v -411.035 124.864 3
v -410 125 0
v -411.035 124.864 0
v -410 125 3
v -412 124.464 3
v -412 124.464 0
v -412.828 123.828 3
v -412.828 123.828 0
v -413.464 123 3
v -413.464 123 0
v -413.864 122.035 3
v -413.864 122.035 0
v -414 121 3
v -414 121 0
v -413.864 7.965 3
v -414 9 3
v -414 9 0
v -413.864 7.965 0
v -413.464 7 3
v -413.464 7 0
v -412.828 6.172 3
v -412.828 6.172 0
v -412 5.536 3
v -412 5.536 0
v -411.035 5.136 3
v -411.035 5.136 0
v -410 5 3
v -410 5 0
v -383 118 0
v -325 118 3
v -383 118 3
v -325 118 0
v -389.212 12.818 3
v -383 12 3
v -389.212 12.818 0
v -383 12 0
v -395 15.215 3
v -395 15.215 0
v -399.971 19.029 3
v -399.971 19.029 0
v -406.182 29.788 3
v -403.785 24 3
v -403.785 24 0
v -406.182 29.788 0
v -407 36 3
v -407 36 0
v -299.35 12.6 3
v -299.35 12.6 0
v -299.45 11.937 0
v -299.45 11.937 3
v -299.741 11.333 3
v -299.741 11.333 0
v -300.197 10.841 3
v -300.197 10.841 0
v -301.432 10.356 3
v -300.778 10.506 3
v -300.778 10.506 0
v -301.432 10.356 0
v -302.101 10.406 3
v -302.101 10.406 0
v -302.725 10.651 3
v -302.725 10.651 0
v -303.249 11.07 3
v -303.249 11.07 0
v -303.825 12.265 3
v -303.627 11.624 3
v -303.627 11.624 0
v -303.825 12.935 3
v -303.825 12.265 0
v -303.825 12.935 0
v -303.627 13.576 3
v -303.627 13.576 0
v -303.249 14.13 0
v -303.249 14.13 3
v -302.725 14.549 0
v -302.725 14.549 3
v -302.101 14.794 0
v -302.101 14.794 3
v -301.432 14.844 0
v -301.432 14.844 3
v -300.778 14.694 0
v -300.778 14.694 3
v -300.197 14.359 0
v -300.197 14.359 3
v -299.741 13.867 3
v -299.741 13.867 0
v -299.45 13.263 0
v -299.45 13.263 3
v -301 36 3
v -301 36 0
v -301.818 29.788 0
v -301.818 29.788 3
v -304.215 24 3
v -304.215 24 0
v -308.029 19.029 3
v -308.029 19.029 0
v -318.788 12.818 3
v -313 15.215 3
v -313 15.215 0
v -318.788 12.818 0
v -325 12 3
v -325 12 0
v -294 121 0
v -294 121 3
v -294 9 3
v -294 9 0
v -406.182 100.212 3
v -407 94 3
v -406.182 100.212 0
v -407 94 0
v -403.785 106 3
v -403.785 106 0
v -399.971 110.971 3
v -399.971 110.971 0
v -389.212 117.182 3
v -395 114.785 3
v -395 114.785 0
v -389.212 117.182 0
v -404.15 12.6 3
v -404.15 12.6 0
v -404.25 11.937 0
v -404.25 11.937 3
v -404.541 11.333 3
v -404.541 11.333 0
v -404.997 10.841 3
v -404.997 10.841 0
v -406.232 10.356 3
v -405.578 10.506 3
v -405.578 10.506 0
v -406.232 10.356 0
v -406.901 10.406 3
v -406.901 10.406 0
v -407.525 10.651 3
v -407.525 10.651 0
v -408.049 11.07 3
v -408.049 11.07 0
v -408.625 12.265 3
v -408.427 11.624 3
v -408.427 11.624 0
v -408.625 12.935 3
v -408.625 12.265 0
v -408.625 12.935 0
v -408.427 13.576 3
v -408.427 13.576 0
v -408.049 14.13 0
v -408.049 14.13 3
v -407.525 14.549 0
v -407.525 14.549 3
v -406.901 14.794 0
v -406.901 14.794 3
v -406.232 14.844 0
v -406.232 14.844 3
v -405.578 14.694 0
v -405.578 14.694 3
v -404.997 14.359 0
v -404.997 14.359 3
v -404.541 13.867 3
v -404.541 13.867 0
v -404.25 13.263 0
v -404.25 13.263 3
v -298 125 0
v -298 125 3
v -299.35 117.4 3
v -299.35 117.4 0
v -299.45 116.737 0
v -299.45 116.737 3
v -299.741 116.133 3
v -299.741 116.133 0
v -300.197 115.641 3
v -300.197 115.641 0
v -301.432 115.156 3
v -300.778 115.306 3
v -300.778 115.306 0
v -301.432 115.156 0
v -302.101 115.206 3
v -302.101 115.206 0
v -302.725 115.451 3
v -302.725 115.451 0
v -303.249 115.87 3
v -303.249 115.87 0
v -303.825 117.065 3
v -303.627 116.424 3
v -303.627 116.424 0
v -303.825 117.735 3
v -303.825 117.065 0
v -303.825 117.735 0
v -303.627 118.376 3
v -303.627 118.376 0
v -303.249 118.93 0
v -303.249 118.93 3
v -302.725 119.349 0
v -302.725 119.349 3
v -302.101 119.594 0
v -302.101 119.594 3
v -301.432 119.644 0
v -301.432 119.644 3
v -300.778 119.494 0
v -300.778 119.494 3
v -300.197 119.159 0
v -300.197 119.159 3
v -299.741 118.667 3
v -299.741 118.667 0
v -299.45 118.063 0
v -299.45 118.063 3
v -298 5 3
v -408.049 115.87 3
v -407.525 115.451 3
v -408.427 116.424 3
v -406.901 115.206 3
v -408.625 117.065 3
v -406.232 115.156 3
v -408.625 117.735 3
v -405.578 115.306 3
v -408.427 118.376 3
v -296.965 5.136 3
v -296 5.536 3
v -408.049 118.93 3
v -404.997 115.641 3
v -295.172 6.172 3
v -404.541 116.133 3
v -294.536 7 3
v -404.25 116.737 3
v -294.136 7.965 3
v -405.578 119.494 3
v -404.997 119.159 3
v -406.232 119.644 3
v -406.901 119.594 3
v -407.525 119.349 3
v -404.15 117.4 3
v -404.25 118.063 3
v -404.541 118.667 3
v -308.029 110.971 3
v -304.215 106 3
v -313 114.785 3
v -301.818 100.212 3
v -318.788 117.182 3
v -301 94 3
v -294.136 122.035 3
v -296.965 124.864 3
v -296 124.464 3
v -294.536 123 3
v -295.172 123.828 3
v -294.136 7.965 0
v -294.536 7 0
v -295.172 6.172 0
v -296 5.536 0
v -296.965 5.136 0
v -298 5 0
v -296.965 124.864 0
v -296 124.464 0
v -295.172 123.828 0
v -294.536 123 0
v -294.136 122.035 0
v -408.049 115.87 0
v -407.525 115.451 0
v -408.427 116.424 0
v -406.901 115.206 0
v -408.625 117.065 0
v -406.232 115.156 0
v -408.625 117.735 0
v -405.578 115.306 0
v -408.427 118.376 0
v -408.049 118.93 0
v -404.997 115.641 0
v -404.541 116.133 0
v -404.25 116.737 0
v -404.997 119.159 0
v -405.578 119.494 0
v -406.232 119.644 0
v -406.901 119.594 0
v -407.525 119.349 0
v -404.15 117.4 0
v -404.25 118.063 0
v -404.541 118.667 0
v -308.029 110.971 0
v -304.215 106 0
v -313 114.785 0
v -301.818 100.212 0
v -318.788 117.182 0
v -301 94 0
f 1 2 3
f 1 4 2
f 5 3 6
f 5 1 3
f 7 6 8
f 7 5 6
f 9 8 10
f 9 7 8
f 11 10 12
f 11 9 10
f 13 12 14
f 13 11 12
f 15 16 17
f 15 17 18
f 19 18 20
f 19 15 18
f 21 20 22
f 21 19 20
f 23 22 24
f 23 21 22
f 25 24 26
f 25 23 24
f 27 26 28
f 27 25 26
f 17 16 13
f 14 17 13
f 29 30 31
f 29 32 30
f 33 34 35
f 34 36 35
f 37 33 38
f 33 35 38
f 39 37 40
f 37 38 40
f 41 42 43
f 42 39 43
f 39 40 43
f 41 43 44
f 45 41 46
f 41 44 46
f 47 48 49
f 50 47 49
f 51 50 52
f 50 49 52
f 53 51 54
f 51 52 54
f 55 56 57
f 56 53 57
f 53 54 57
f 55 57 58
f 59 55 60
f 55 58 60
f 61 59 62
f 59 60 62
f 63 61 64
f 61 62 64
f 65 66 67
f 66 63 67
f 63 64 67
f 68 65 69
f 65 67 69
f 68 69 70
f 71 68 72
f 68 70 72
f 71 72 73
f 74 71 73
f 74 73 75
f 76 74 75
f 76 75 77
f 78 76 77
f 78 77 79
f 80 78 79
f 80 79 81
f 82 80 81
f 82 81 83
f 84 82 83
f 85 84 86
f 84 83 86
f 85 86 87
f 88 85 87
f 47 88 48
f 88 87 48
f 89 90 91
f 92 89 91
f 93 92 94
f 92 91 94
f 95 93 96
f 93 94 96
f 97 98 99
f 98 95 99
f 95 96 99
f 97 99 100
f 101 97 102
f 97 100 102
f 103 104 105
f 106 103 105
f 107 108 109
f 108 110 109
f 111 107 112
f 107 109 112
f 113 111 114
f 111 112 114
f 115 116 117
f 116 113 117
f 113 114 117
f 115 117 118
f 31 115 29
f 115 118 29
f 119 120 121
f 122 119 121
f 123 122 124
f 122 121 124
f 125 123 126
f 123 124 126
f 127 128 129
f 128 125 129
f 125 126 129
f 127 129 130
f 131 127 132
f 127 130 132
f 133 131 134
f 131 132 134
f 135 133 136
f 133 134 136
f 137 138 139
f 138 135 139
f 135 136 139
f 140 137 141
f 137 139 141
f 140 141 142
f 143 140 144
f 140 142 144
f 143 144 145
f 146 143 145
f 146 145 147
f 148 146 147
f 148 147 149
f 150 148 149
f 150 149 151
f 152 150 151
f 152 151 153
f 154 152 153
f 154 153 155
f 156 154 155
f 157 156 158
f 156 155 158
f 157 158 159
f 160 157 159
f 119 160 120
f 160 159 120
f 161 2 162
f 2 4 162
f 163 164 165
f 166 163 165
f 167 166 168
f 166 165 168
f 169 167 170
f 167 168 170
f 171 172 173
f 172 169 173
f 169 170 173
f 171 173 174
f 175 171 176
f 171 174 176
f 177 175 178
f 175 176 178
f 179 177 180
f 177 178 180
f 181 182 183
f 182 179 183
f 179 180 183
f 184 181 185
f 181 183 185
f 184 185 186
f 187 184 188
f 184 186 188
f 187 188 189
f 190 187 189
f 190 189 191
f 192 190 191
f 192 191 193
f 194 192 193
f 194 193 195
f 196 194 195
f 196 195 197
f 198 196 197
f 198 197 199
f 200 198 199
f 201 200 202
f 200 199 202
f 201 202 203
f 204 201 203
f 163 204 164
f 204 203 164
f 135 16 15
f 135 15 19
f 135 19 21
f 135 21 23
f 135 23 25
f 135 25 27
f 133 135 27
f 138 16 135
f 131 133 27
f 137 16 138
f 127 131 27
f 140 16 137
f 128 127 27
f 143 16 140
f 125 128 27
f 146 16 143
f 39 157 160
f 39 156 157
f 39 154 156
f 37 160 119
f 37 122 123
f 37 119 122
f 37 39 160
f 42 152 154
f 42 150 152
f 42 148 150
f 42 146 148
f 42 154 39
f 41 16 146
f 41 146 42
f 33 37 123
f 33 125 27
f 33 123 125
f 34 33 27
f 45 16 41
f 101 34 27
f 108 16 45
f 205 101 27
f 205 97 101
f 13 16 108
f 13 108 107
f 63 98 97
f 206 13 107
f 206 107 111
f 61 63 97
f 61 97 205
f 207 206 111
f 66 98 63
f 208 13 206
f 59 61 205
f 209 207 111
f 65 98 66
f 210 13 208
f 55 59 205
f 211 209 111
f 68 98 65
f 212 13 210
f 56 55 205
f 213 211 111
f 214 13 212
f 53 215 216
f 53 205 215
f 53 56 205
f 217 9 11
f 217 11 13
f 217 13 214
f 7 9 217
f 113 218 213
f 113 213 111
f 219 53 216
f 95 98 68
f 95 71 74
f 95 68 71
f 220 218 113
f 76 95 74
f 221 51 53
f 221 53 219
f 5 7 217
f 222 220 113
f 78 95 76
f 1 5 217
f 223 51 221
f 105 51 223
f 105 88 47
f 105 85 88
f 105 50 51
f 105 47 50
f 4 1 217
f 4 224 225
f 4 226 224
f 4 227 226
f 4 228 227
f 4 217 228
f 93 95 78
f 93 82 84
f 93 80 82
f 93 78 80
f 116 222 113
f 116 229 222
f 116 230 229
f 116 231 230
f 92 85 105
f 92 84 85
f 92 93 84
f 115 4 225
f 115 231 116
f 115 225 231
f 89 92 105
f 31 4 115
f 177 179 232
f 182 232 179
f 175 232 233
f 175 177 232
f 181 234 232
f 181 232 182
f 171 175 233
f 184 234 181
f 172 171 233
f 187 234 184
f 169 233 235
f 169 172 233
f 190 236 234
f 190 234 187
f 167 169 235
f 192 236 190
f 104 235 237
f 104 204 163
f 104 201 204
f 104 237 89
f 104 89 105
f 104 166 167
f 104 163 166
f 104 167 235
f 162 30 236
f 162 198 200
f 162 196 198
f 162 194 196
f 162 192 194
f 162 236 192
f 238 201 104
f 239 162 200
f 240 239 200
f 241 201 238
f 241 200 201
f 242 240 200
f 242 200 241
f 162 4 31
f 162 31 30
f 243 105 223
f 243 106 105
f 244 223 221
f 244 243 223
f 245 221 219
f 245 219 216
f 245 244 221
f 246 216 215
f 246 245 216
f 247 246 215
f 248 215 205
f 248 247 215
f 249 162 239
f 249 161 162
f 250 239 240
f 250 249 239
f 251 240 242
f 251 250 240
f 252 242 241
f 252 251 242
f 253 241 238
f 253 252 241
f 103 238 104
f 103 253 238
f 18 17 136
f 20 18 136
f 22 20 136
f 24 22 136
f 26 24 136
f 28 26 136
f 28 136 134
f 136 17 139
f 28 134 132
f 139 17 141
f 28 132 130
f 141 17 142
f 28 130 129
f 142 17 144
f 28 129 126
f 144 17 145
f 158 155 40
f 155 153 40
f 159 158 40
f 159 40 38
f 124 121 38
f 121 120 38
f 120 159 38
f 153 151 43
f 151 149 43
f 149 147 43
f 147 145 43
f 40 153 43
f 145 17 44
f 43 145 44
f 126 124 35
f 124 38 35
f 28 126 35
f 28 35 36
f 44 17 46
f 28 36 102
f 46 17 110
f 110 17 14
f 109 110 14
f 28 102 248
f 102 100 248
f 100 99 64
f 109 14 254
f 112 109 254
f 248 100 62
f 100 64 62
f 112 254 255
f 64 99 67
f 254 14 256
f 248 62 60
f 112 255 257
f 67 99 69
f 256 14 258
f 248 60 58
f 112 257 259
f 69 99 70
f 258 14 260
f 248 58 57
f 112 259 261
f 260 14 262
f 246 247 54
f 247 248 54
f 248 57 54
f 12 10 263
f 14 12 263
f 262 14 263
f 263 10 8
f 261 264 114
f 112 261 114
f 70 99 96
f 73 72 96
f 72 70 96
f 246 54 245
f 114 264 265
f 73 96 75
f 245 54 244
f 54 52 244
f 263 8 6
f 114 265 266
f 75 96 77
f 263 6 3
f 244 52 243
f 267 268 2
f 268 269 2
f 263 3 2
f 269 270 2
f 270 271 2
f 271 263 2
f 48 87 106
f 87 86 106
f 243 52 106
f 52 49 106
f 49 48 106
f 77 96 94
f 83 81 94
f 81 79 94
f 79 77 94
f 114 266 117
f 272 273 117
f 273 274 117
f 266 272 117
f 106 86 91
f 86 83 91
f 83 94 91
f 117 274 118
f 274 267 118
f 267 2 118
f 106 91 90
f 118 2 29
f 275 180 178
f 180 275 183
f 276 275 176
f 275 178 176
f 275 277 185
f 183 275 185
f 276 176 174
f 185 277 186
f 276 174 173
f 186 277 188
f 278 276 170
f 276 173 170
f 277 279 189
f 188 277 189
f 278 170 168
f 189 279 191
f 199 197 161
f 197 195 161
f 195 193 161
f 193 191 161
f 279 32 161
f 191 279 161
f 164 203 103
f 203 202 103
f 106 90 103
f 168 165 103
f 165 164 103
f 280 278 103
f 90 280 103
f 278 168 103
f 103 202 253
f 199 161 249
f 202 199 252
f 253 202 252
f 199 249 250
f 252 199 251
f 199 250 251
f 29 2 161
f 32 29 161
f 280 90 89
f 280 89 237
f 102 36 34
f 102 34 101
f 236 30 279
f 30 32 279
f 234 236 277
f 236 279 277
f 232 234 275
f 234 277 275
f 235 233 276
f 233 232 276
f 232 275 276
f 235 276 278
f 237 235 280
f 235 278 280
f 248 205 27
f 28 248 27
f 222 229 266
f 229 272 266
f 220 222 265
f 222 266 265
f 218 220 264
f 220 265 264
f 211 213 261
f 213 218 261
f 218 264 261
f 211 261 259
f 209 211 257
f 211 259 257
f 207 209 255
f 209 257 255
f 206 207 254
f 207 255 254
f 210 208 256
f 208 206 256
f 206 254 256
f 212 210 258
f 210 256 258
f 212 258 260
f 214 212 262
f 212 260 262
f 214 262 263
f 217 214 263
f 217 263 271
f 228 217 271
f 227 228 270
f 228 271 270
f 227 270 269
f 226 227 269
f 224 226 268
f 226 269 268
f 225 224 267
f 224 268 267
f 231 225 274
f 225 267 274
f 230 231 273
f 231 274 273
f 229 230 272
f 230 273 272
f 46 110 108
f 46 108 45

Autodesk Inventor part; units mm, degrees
ref_plane "YZ Plane" through (0, 0, 0) normal (1, 0, 0) x (0, 1, 0)
ref_plane "XZ Plane" through (0, 0, 0) normal (0, 1, 0) x (-1, 0, 0)
ref_plane "XY Plane" through (0, 0, 0) normal (0, 0, 1) x (1, 0, 0)
sketch "スケッチ1" plane through (0, 0, 0) normal (0, 0, 1) x (1, 0, 0)
  circle A0 centre (5, 125) radius 2.25 construction
  circle A1 centre (5, 5) radius 2.25 construction
  circle A2 centre (-473, 125) radius 2.25 construction
  circle A3 centre (-473, 5) radius 2.25 construction
  line L0 (-478, 130) -> (-478, 0) construction
  line L1 (10, 0) -> (10, 130) construction
  line L2 (10, 130) -> (-478, 130)
  line L3 (-478, 130) -> (-478, 0)
  line L4 (-478, 0) -> (10, 0)
  line L5 (10, 0) -> (10, 130)
  circle A4 centre (5, 125) radius 1.6
  circle A5 centre (5, 5) radius 1.6
  circle A6 centre (-473, 5) radius 1.6
  circle A7 centre (-473, 125) radius 1.6
  line L6 (10, 65) -> (-478, 65) construction
  line L7 (-205, 118) -> (-263, 118)
  line L8 (-287, 94) -> (-287, 36)
  line L9 (-263, 12) -> (-205, 12)
  line L10 (-181, 36) -> (-181, 94)
  arc A8 (-181, 94) -> (-205, 118) centre (-205, 94) ccw
  arc A9 (-205, 12) -> (-181, 36) centre (-205, 36) ccw
  arc A10 (-287, 36) -> (-263, 12) centre (-263, 36) ccw
  arc A11 (-263, 118) -> (-287, 94) centre (-263, 94) ccw
  line L11 (-174, 125) -> (-294, 125) construction
  line L12 (-294, 125) -> (-294, 5) construction
  line L13 (-294, 5) -> (-174, 5) construction
  line L14 (-174, 5) -> (-174, 125) construction
  line L15 (-181.6, 117.4) -> (-286.4, 117.4) construction
  line L16 (-286.4, 117.4) -> (-286.4, 12.6) construction
  line L17 (-286.4, 12.6) -> (-181.6, 12.6) construction
  line L18 (-181.6, 12.6) -> (-181.6, 117.4) construction
  circle A12 centre (-181.6, 117.4) radius 2.25
  circle A13 centre (-181.6, 12.6) radius 2.25
  circle A14 centre (-286.4, 12.6) radius 2.25
  circle A15 centre (-286.4, 117.4) radius 2.25
  circle A16 centre (-301.6, 117.4) radius 2.25
  arc A17 (-301, 94) -> (-325, 118) centre (-325, 94) ccw
  line L19 (-301, 36) -> (-301, 94)
  arc A18 (-325, 12) -> (-301, 36) centre (-325, 36) ccw
  circle A19 centre (-301.6, 12.6) radius 2.25
  line L20 (-383, 12) -> (-325, 12)
  arc A20 (-407, 36) -> (-383, 12) centre (-383, 36) ccw
  circle A21 centre (-406.4, 12.6) radius 2.25
  line L21 (-407, 94) -> (-407, 36)
  circle A22 centre (-406.4, 117.4) radius 2.25
  arc A23 (-383, 118) -> (-407, 94) centre (-383, 94) ccw
  line L22 (-325, 118) -> (-383, 118)
  circle A24 centre (-61.6, 117.4) radius 2.25
  arc A25 (-61, 94) -> (-85, 118) centre (-85, 94) ccw
  line L23 (-61, 36) -> (-61, 94)
  arc A26 (-85, 12) -> (-61, 36) centre (-85, 36) ccw
  circle A27 centre (-61.6, 12.6) radius 2.25
  line L24 (-143, 12) -> (-85, 12)
  arc A28 (-167, 36) -> (-143, 12) centre (-143, 36) ccw
  circle A29 centre (-166.4, 12.6) radius 2.25
  line L25 (-167, 94) -> (-167, 36)
  circle A30 centre (-166.4, 117.4) radius 2.25
  arc A31 (-143, 118) -> (-167, 94) centre (-143, 94) ccw
  line L26 (-85, 118) -> (-143, 118)
  circle A32 centre (-181.6, 117.4) radius 2.25
  arc A33 (-181, 94) -> (-205, 118) centre (-205, 94) ccw
  line L27 (-181, 36) -> (-181, 94)
  arc A34 (-205, 12) -> (-181, 36) centre (-205, 36) ccw
  circle A35 centre (-181.6, 12.6) radius 2.25
  line L28 (-263, 12) -> (-205, 12)
  arc A36 (-287, 36) -> (-263, 12) centre (-263, 36) ccw
  circle A37 centre (-286.4, 12.6) radius 2.25
  line L29 (-287, 94) -> (-287, 36)
  circle A38 centre (-286.4, 117.4) radius 2.25
  arc A39 (-263, 118) -> (-287, 94) centre (-263, 94) ccw
  line L30 (-205, 118) -> (-263, 118)
  point P0 (0, 0)
  point P1 (-234, 65)
  point P2 (-287, 12)
  point P3 (-287, 118)
  point P4 (-181, 12)
  point P5 (-287, 65)
  point P6 (-294, 65)
  point P7 (-234, 12)
  point P8 (-234, 5)
  point P9 (-234, 118)
  point P10 (-181, 65)
  point P11 (-174, 65)
  point P12 (-181.6, 65)
  point P13 (-234, 125)
  point P14 (-234, 117.4)
  point P15 (-301, 12)
  point P16 (-301, 65)
  point P17 (-407, 12)
  point P18 (-354, 12)
  point P19 (-407, 118)
  point P20 (-407, 65)
  point P21 (-354, 118)
  point P22 (-61, 12)
  point P23 (-61, 65)
  point P24 (-167, 12)
  point P25 (-114, 12)
  point P26 (-167, 118)
  point P27 (-167, 65)
  point P28 (-114, 118)
  point P29 (-181, 12)
  point P30 (-181, 65)
  point P31 (-287, 12)
  point P32 (-234, 12)
  point P33 (-287, 118)
  point P34 (-287, 65)
  point P35 (-234, 118)
  dimension "d0" = 3.2
  dimension "d1" = 106
  dimension "d2" = 106
  dimension "d3" = 24
  dimension "d4" = 120
  dimension "d5" = 120
  dimension "d6" = 104.8
  dimension "d7" = 104.8
  dimension "d8" = 4.5
  dimension "d11" = 120
  dimension "d14" = 120
extrude "押し出し1" add sketch "スケッチ1" along normal blind 3
sketch "スケッチ2" plane through (0, 0, 3) normal (0, 0, 1) x (1, 0, 0)
  line L0 (-478, 130) -> (-478, 0) projected
  line L1 (-478, 0) -> (10, 0) projected
  line L2 (10, 0) -> (10, 130) projected
  line L3 (10, 130) -> (-478, 130) projected
  circle A0 centre (-286.4, 117.4) radius 2.25 projected
  arc A1 (-263, 118) -> (-287, 94) centre (-263, 94) ccw projected
  line L4 (-263, 118) -> (-205, 118) projected
  arc A2 (-181, 94) -> (-205, 118) centre (-205, 94) ccw projected
  line L5 (-181, 94) -> (-181, 36) projected
  arc A3 (-205, 12) -> (-181, 36) centre (-205, 36) ccw projected
  line L6 (-205, 12) -> (-263, 12) projected
  arc A4 (-287, 36) -> (-263, 12) centre (-263, 36) ccw projected
  line L7 (-287, 36) -> (-287, 94) projected
  circle A5 centre (-473, 125) radius 1.6 projected
  circle A6 centre (-473, 5) radius 1.6 projected
  circle A7 centre (5, 5) radius 1.6 projected
  circle A8 centre (5, 125) radius 1.6 projected
  circle A9 centre (-181.6, 117.4) radius 2.25 projected
  circle A10 centre (-181.6, 12.6) radius 2.25 projected
  circle A11 centre (-286.4, 12.6) radius 2.25 projected
  circle A12 centre (-166.4, 117.4) radius 2.25 projected
  circle A13 centre (-166.4, 12.6) radius 2.25 projected
  circle A14 centre (-61.6, 12.6) radius 2.25 projected
  line L8 (-61, 94) -> (-61, 36) projected
  arc A15 (-85, 12) -> (-61, 36) centre (-85, 36) ccw projected
  line L9 (-85, 12) -> (-143, 12) projected
  arc A16 (-167, 36) -> (-143, 12) centre (-143, 36) ccw projected
  line L10 (-167, 36) -> (-167, 94) projected
  arc A17 (-143, 118) -> (-167, 94) centre (-143, 94) ccw projected
  line L11 (-143, 118) -> (-85, 118) projected
  arc A18 (-61, 94) -> (-85, 118) centre (-85, 94) ccw projected
  circle A19 centre (-61.6, 117.4) radius 2.25 projected
  circle A20 centre (-406.4, 117.4) radius 2.25 projected
  circle A21 centre (-406.4, 12.6) radius 2.25 projected
  circle A22 centre (-301.6, 12.6) radius 2.25 projected
  line L12 (-301, 94) -> (-301, 36) projected
  arc A23 (-325, 12) -> (-301, 36) centre (-325, 36) ccw projected
  line L13 (-325, 12) -> (-383, 12) projected
  arc A24 (-407, 36) -> (-383, 12) centre (-383, 36) ccw projected
  line L14 (-407, 36) -> (-407, 94) projected
  arc A25 (-383, 118) -> (-407, 94) centre (-383, 94) ccw projected
  line L15 (-383, 118) -> (-325, 118) projected
  arc A26 (-301, 94) -> (-325, 118) centre (-325, 94) ccw projected
  circle A27 centre (-301.6, 117.4) radius 2.25 projected
  line L16 (-477.9, 129.9) -> (-477.9, 0.1)
  line L17 (-477.9, 0.1) -> (9.9, 0.1)
  line L18 (9.9, 0.1) -> (9.9, 129.9)
  line L19 (9.9, 129.9) -> (-477.9, 129.9)
  point P0 (0, 0)
  dimension "d19" = 0.1
extrude "押し出し2" cut sketch "スケッチ2" against normal through all contours L3 L2 L1 L0
fillet "フィレット1" radius 2 4 edges at (-477.9, 129.9, 1.5) (-477.9, 0.1, 1.5) (9.9, 0.1, 1.5) (9.9, 129.9, 1.5)
sketch "スケッチ3" plane through (0, 0, 3) normal (0, 0, 1) x (1, 0, 0)
  arc A0 (9.9, 127.9) -> (7.9, 129.9) centre (7.9, 127.9) ccw projected
  line L0 (7.9, 129.9) -> (-475.9, 129.9) projected
  arc A1 (-475.9, 129.9) -> (-477.9, 127.9) centre (-475.9, 127.9) ccw projected
  line L1 (-477.9, 127.9) -> (-477.9, 2.1) projected
  arc A2 (-477.9, 2.1) -> (-475.9, 0.1) centre (-475.9, 2.1) ccw projected
  line L2 (-475.9, 0.1) -> (7.9, 0.1) projected
  arc A3 (7.9, 0.1) -> (9.9, 2.1) centre (7.9, 2.1) ccw projected
  line L3 (9.9, 2.1) -> (9.9, 127.9) projected
  circle A4 centre (-286.4, 117.4) radius 2.25 projected
  arc A5 (-263, 118) -> (-287, 94) centre (-263, 94) ccw projected
  line L4 (-263, 118) -> (-205, 118) projected
  arc A6 (-181, 94) -> (-205, 118) centre (-205, 94) ccw projected
  line L5 (-181, 94) -> (-181, 36) projected
  arc A7 (-205, 12) -> (-181, 36) centre (-205, 36) ccw projected
  line L6 (-205, 12) -> (-263, 12) projected
  arc A8 (-287, 36) -> (-263, 12) centre (-263, 36) ccw projected
  line L7 (-287, 36) -> (-287, 94) projected
  circle A9 centre (-473, 125) radius 1.6 projected
  circle A10 centre (-473, 5) radius 1.6 projected
  circle A11 centre (5, 5) radius 1.6 projected
  circle A12 centre (5, 125) radius 1.6 projected
  circle A13 centre (-181.6, 117.4) radius 2.25 projected
  circle A14 centre (-181.6, 12.6) radius 2.25 projected
  circle A15 centre (-286.4, 12.6) radius 2.25 projected
  circle A16 centre (-166.4, 117.4) radius 2.25 projected
  circle A17 centre (-166.4, 12.6) radius 2.25 projected
  circle A18 centre (-61.6, 12.6) radius 2.25 projected
  line L8 (-61, 94) -> (-61, 36) projected
  arc A19 (-85, 12) -> (-61, 36) centre (-85, 36) ccw projected
  line L9 (-85, 12) -> (-143, 12) projected
  arc A20 (-167, 36) -> (-143, 12) centre (-143, 36) ccw projected
  line L10 (-167, 36) -> (-167, 94) projected
  arc A21 (-143, 118) -> (-167, 94) centre (-143, 94) ccw projected
  line L11 (-143, 118) -> (-85, 118) projected
  arc A22 (-61, 94) -> (-85, 118) centre (-85, 94) ccw projected
  circle A23 centre (-61.6, 117.4) radius 2.25 projected
  circle A24 centre (-406.4, 117.4) radius 2.25 projected
  circle A25 centre (-406.4, 12.6) radius 2.25 projected
  circle A26 centre (-301.6, 12.6) radius 2.25 projected
  line L12 (-301, 94) -> (-301, 36) projected
  arc A27 (-325, 12) -> (-301, 36) centre (-325, 36) ccw projected
  line L13 (-325, 12) -> (-383, 12) projected
  arc A28 (-407, 36) -> (-383, 12) centre (-383, 36) ccw projected
  line L14 (-407, 36) -> (-407, 94) projected
  arc A29 (-383, 118) -> (-407, 94) centre (-383, 94) ccw projected
  line L15 (-383, 118) -> (-325, 118) projected
  arc A30 (-301, 94) -> (-325, 118) centre (-325, 94) ccw projected
  circle A31 centre (-301.6, 117.4) radius 2.25 projected
  line L16 (-410, 125) -> (-58, 125)
  line L17 (-54, 121) -> (-54, 9)
  line L18 (-58, 5) -> (-410, 5)
  line L19 (-414, 9) -> (-414, 121)
  arc A32 (-410, 125) -> (-414, 121) centre (-410, 121) ccw
  arc A33 (-414, 9) -> (-410, 5) centre (-410, 9) ccw
  arc A34 (-58, 5) -> (-54, 9) centre (-58, 9) ccw
  arc A35 (-54, 121) -> (-58, 125) centre (-58, 121) ccw
  line L20 (-294, 125) -> (-294, 5)
  point P0 (0, 0)
  point P1 (-414, 125)
  point P2 (-54, 125)
  point P3 (-234, 125)
  point P4 (-234, 118)
  point P5 (-414, 65)
  point P6 (-407, 65)
  dimension "d23" = 120
  dimension "d24" = 360
  dimension "d25" = 4
  dimension "d28" = 120
extrude "押し出し3" cut sketch "スケッチ3" against normal blind 10 contours A24 | A25 | A26 | A31 | L16 L20 L18 A33 L19 A32 keep common part
fillet "フィレット2" radius 4 2 edges at (-294, 125, 1.5) (-294, 5, 1.5)
equation "\"d5\" = d4"
equation "\"d7\" = d6"
properties part number "radiator_adapter_04"
